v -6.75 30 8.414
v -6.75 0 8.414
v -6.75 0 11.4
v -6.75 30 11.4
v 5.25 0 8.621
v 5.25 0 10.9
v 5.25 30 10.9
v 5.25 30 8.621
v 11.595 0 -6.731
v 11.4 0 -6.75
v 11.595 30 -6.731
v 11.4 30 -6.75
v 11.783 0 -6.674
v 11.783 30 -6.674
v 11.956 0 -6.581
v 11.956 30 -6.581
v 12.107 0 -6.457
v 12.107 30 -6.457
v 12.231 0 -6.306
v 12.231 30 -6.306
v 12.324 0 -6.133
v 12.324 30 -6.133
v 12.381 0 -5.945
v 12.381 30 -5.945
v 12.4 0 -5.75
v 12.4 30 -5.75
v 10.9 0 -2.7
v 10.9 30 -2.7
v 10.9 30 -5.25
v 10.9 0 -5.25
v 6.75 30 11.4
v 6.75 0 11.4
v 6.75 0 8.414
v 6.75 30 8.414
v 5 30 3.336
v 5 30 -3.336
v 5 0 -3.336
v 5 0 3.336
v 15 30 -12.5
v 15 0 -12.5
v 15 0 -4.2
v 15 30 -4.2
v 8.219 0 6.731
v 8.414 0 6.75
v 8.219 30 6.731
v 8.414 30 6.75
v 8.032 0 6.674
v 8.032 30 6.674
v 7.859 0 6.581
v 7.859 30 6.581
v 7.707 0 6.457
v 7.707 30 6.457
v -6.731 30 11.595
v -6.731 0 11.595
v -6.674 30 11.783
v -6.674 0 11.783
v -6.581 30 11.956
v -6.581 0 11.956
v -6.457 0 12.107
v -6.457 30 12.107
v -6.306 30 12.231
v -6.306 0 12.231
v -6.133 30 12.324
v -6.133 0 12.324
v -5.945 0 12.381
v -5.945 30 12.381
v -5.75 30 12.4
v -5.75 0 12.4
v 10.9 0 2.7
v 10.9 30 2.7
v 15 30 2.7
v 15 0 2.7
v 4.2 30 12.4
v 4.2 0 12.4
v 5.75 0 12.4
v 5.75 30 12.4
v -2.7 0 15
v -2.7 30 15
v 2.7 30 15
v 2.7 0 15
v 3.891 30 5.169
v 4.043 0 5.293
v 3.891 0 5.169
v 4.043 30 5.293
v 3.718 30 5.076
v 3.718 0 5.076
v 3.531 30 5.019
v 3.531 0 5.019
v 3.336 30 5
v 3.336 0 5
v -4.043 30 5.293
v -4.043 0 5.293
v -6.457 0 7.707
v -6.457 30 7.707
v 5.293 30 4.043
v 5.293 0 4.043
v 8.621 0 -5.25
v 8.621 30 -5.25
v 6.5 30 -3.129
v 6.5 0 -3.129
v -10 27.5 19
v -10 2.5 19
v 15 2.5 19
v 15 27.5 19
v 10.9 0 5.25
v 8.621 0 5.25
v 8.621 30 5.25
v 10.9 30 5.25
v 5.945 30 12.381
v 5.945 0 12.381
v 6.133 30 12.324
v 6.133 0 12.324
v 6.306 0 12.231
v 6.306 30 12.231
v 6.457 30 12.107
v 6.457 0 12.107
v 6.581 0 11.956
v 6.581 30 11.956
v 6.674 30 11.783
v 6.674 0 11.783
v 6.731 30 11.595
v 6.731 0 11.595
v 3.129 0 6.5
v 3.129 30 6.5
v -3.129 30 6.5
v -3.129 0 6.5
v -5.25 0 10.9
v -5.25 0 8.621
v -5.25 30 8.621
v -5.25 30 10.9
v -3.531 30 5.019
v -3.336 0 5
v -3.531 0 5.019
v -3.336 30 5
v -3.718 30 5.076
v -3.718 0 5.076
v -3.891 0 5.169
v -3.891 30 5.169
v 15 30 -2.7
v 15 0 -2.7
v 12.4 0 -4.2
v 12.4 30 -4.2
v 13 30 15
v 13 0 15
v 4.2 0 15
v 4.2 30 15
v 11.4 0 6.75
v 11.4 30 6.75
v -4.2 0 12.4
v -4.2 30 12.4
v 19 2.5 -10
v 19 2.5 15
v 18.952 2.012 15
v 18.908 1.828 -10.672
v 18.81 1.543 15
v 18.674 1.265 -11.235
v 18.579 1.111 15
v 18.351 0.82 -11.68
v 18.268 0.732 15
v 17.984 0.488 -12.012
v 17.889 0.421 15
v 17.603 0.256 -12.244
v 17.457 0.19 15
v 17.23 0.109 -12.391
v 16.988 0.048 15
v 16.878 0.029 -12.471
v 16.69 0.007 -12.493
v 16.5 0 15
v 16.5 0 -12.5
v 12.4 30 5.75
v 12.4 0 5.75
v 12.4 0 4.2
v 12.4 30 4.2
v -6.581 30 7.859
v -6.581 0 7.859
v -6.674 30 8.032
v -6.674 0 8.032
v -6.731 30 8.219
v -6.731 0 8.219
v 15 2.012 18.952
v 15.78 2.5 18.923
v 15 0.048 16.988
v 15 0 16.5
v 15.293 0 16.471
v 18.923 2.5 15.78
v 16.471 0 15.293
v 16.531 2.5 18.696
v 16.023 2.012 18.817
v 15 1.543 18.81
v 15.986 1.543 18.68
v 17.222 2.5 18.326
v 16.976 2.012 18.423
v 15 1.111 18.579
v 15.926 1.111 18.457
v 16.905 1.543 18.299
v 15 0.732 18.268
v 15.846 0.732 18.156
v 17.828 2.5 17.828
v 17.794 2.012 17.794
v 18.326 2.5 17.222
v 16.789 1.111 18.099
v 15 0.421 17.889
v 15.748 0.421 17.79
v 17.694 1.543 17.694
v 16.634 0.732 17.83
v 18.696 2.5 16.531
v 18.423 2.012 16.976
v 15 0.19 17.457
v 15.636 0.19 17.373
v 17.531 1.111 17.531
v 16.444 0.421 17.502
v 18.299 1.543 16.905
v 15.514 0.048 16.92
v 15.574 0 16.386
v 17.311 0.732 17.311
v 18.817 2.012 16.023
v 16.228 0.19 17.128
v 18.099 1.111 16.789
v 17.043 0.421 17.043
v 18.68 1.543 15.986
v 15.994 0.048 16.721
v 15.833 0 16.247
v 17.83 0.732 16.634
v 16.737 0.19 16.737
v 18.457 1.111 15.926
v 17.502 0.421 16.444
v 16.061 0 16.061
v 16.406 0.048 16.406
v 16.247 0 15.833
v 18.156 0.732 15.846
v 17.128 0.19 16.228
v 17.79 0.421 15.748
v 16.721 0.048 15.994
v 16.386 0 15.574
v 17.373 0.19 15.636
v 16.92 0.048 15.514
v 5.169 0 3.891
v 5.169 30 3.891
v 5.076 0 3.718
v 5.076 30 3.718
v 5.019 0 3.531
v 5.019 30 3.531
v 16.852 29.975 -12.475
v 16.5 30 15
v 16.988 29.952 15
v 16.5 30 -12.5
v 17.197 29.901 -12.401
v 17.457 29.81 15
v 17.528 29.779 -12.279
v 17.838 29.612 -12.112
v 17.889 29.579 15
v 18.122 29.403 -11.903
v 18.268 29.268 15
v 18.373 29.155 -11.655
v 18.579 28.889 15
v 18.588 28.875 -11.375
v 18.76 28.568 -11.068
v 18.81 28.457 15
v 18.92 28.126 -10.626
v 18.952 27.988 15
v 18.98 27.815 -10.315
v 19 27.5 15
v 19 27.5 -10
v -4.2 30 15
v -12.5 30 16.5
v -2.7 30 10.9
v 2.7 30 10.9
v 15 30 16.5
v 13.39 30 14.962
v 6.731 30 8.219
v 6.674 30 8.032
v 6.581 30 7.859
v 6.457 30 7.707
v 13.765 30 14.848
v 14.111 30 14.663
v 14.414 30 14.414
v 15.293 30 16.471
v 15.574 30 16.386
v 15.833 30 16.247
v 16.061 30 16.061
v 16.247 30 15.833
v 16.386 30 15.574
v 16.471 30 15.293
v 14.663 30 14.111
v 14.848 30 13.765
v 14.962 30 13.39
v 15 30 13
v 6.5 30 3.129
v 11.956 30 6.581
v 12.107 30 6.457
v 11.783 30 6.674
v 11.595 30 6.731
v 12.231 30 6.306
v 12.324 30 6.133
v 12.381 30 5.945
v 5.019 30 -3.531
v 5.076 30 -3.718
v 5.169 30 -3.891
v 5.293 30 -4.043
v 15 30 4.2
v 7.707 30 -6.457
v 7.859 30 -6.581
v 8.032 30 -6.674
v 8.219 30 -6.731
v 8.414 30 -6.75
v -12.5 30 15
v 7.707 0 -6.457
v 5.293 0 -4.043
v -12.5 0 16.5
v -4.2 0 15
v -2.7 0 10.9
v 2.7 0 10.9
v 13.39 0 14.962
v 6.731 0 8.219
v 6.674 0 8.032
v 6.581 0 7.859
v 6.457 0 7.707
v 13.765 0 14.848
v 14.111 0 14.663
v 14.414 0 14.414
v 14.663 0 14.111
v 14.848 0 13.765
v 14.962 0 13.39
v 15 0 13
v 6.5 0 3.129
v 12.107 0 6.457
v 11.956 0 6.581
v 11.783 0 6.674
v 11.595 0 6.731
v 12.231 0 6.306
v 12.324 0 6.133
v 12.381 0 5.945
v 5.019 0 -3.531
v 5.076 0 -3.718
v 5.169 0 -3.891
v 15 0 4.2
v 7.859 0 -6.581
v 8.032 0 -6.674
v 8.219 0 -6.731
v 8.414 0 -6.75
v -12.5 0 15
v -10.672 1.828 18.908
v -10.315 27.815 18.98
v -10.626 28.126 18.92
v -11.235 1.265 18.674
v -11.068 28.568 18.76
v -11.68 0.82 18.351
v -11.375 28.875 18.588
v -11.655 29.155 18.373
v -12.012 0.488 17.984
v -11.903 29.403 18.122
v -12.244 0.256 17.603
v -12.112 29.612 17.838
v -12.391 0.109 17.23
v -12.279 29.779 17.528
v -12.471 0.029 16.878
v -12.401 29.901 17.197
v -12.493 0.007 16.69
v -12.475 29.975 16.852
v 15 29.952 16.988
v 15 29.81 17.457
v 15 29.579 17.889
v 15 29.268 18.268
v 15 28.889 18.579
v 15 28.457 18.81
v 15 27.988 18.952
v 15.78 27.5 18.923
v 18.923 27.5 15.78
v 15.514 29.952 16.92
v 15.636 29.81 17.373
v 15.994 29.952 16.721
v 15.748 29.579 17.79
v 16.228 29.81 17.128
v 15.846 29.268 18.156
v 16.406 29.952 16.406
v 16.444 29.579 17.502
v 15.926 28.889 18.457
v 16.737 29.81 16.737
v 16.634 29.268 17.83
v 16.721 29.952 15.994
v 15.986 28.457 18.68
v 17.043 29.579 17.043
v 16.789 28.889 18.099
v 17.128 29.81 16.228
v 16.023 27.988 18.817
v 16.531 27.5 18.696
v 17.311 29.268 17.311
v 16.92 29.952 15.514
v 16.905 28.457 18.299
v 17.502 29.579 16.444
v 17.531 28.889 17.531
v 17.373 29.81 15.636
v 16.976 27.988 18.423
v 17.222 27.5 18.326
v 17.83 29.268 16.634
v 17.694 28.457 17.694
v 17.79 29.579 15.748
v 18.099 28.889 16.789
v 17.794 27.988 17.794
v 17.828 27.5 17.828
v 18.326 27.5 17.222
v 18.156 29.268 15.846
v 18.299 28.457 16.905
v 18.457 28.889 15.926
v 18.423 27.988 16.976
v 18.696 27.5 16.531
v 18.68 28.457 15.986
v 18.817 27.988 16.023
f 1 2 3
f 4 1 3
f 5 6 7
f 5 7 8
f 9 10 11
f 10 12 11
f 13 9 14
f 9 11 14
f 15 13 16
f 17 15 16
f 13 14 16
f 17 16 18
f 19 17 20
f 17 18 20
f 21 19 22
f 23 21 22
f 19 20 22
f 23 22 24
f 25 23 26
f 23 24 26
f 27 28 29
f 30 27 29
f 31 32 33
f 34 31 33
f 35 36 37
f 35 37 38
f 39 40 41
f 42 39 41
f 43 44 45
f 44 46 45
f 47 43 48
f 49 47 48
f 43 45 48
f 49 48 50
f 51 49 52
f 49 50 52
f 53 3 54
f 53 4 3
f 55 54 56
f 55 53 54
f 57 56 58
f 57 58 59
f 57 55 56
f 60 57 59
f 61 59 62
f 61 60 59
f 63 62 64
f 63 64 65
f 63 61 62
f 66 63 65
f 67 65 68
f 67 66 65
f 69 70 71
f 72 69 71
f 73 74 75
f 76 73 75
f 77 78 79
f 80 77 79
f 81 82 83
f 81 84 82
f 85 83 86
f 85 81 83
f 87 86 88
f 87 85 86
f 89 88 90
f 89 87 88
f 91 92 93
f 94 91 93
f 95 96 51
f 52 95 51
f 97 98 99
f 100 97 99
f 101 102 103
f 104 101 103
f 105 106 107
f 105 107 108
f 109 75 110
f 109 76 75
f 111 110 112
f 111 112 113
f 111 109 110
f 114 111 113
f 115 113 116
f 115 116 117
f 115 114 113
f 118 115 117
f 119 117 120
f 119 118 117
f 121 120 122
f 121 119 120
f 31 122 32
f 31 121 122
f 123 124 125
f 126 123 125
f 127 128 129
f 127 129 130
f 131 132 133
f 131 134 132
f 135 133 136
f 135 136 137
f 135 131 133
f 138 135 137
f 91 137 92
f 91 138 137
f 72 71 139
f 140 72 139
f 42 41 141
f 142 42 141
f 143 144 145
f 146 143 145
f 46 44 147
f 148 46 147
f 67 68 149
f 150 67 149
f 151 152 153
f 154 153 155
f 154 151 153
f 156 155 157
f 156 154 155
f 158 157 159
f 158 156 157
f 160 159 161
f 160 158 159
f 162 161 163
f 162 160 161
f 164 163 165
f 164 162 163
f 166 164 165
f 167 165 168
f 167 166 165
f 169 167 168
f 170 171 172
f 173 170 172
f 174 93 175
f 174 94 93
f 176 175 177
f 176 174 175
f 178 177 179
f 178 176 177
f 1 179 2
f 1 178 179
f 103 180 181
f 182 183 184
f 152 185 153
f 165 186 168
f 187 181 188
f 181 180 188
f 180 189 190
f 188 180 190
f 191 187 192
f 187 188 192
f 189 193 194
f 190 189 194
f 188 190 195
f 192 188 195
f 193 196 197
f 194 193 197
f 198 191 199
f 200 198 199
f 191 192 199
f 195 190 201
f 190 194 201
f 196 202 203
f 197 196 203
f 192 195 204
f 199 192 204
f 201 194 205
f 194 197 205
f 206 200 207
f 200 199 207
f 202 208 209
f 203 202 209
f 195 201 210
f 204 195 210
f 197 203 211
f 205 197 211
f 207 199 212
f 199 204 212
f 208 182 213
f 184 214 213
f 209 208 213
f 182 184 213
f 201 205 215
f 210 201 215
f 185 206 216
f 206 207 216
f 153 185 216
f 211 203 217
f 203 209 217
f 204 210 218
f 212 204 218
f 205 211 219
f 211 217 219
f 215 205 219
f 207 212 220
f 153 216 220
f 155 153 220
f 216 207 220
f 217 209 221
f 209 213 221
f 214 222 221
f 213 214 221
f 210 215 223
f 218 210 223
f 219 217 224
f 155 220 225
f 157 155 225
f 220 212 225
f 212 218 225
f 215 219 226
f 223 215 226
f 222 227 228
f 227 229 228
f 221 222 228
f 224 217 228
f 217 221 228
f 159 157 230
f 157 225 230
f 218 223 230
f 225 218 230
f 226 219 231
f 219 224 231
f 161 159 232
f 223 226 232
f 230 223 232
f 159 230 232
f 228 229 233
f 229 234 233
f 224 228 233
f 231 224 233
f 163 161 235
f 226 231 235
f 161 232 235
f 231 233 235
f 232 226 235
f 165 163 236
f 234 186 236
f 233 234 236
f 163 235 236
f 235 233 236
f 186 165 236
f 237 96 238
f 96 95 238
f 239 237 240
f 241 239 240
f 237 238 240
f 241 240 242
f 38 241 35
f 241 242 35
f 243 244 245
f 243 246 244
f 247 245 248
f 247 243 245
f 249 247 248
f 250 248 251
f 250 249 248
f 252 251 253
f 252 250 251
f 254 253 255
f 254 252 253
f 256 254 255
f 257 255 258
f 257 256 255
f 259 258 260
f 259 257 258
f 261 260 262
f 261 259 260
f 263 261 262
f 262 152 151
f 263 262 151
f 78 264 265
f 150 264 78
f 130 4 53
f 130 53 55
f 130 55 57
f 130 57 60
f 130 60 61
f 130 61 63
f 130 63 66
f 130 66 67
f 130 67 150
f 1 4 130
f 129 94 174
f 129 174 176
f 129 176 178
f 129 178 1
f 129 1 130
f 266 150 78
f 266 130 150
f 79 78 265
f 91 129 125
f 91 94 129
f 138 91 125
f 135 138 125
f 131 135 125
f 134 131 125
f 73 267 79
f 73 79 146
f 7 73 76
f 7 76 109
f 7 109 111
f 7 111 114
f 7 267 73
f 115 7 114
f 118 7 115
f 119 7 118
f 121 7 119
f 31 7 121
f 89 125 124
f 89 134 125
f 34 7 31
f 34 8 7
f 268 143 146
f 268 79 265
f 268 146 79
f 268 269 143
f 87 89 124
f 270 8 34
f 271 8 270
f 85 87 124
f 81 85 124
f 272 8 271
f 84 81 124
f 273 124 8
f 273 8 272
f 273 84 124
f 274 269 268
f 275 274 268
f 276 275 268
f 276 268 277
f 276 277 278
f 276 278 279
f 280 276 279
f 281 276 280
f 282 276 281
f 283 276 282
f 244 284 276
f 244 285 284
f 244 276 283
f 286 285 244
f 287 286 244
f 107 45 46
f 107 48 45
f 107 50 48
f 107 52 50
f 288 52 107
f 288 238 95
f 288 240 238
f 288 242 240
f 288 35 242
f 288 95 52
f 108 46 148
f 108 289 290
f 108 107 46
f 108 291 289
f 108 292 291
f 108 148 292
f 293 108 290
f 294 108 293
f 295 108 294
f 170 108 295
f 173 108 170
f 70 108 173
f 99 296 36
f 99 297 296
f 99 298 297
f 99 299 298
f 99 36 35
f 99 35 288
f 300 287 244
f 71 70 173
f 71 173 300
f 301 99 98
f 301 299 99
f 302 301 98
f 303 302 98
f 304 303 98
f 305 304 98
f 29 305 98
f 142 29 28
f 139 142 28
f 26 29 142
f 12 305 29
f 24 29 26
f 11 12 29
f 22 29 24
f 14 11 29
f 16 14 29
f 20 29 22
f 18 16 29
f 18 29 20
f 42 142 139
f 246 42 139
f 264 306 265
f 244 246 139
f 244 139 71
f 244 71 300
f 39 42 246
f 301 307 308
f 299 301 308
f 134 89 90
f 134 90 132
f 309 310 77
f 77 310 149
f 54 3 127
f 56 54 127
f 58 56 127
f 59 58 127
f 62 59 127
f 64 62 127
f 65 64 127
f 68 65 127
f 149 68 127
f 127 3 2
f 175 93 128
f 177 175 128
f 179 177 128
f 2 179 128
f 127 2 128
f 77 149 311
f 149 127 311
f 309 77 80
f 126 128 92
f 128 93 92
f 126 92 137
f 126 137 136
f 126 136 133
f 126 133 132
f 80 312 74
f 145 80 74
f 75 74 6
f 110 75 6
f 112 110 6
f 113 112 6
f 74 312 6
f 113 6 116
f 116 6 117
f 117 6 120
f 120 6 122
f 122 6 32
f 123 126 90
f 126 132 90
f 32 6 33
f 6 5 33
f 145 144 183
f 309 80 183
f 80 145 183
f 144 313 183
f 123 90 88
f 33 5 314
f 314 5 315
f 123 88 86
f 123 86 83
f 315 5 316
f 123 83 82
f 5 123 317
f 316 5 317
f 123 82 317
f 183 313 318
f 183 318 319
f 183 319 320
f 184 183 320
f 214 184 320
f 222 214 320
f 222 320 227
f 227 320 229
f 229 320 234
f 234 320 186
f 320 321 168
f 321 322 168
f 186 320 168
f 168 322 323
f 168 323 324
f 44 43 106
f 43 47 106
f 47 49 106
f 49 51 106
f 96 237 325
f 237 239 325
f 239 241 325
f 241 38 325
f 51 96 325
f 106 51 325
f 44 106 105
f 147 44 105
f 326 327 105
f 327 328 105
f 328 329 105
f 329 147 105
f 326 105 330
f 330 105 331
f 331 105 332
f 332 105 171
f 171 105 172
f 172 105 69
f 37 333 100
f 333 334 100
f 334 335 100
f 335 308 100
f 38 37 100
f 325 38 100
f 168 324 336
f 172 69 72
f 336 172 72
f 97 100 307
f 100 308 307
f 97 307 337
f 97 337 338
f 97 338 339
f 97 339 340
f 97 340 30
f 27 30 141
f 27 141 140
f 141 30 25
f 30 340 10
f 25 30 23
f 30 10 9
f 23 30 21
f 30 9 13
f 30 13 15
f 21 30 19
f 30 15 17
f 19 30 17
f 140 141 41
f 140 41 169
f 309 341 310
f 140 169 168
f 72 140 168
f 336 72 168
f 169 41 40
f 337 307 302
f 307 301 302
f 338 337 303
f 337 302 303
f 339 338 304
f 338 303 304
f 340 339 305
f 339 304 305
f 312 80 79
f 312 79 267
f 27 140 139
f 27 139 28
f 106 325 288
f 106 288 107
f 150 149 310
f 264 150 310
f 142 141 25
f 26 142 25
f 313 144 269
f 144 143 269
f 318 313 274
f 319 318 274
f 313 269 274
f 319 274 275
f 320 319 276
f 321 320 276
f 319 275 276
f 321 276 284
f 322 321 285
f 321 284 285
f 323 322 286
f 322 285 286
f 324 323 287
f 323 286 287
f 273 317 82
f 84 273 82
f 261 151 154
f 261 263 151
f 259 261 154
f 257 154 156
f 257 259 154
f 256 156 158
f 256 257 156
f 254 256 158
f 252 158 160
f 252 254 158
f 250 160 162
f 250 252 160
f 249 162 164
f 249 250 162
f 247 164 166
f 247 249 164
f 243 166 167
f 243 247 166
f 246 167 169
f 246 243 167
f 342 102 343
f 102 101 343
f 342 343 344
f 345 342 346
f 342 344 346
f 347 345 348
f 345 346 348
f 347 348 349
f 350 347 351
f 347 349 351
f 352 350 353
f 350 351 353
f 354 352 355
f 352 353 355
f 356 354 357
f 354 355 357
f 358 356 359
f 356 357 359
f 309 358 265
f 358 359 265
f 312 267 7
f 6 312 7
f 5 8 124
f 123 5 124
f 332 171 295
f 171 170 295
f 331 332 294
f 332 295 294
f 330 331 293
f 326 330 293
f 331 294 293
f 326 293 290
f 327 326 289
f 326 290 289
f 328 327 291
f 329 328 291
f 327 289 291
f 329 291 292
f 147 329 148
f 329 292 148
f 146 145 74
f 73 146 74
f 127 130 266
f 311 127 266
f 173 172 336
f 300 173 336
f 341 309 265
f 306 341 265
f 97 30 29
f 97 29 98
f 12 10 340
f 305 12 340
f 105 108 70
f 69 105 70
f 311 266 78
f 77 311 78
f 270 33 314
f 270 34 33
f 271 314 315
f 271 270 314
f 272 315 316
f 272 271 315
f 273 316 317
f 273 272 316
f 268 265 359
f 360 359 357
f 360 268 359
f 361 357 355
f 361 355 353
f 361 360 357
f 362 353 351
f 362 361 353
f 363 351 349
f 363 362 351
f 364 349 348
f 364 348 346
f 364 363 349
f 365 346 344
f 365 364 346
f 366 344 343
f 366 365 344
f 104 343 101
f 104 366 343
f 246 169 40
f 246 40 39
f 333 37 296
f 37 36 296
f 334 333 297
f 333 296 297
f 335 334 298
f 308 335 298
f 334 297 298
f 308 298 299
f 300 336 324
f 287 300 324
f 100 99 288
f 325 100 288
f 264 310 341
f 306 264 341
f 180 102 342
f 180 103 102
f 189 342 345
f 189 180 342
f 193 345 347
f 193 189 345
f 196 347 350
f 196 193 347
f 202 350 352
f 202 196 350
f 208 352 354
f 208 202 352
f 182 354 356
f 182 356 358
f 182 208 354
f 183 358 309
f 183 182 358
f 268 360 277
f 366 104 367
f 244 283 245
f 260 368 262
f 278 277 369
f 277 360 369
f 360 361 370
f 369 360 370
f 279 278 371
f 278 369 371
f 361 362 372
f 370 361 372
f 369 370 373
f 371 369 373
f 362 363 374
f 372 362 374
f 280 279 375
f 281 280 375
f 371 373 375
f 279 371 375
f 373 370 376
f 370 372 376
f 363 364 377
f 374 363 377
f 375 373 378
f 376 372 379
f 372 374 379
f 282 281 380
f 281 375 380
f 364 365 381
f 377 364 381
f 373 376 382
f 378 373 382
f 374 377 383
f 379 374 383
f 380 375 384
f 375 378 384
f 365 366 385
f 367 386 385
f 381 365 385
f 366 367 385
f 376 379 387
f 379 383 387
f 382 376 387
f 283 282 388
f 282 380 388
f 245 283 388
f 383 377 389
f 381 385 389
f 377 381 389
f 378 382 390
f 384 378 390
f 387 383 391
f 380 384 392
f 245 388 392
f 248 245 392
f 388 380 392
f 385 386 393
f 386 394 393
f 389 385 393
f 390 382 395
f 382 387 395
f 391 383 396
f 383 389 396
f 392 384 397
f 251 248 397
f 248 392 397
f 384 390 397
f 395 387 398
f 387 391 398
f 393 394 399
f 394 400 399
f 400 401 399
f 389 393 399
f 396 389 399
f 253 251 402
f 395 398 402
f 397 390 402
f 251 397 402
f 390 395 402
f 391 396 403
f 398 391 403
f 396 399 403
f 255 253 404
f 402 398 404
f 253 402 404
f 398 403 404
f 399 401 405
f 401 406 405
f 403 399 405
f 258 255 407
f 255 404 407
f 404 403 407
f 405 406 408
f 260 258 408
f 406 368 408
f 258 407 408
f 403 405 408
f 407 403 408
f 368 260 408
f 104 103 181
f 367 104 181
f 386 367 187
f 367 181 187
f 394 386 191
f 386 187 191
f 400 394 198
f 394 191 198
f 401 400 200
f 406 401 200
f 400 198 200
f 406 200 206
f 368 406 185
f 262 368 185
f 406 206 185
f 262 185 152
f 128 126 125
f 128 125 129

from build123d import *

# Parameters (mm, degrees)
BOSS_EXTRUDE1_DEPTH = 30
CUT_EXTRUDE3_REACH  = 51.163
SKETCH4_W           = 2.5
SKETCH4_H           = 30
CUT_EXTRUDE4_REACH  = 49.468
SKETCH5_W           = 2.5
SKETCH5_H           = 30
FILLET1_R           = 2.5
FILLET2_R           = 2
FILLET3_R           = 1
CUT_EXTRUDE5_REACH  = 42.274


with BuildPart() as part:
    # Sketch1 → Boss-Extrude1 (new body)
    with BuildSketch(Plane(origin=(0, 0, 0), x_dir=(1, 0, 0), z_dir=(0, 1, 0))):
        with BuildLine():
            Line((19, -15), (19, 15))
            Line((19, 15), (15, 15))
            Line((15, 15), (15, 4.2))
            Line((15, 4.2), (12.4, 4.2))
            Line((12.4, 4.2), (12.4, 6.75))
            Line((12.4, 6.75), (8, 6.75))
            Line((8, 6.75), (5, 3.75))
            Line((5, 3.75), (5, -3.75))
            Line((5, -3.75), (8, -6.75))
            Line((8, -6.75), (12.4, -6.75))
            Line((12.4, -6.75), (12.4, -4.2))
            Line((12.4, -4.2), (15, -4.2))
            Line((15, -4.2), (15, -15))
            Line((15, -15), (4.2, -15))
            Line((4.2, -15), (4.2, -12.4))
            Line((4.2, -12.4), (6.75, -12.4))
            Line((6.75, -12.4), (6.75, -8))
            Line((6.75, -8), (3.75, -5))
            Line((3.75, -5), (-3.75, -5))
            Line((-3.75, -5), (-6.75, -8))
            Line((-6.75, -8), (-6.75, -12.4))
            Line((-6.75, -12.4), (-4.2, -12.4))
            Line((-4.2, -12.4), (-4.2, -15))
            Line((-4.2, -15), (-15, -15))
            Line((-15, -15), (-15, -19))
            Line((-15, -19), (15, -19))
            ThreePointArc((15, -19), (17.828427125, -17.828427125), (19, -15))
        make_face()
    extrude(amount=BOSS_EXTRUDE1_DEPTH)

    # Sketch4 → Cut-Extrude3 (cut, up to next)
    with BuildSketch(Plane.XY.offset(19), mode=Mode.PRIVATE) as cut_extrude3_sk1:
        with Locations((-13.75, 15)):
            Rectangle(SKETCH4_W, SKETCH4_H)
    cut_extrude3_tool1 = extrude(cut_extrude3_sk1.sketch, amount=-CUT_EXTRUDE3_REACH, mode=Mode.PRIVATE) & part.part
    add(cut_extrude3_tool1.solids().sort_by_distance((-13.75, 15, 19))[0], mode=Mode.SUBTRACT)

    # Sketch5 → Cut-Extrude4 (cut, up to next)
    with BuildSketch(Plane(origin=(19, 0, 0), x_dir=(0, 0, -1), z_dir=(1, 0, 0)), mode=Mode.PRIVATE) as cut_extrude4_sk1:
        with Locations((13.75, 15)):
            Rectangle(SKETCH5_W, SKETCH5_H)
    cut_extrude4_tool1 = extrude(cut_extrude4_sk1.sketch, amount=-CUT_EXTRUDE4_REACH, mode=Mode.PRIVATE) & part.part
    add(cut_extrude4_tool1.solids().sort_by_distance((19, 15, -13.75))[0], mode=Mode.SUBTRACT)

    # Fillet1
    fillet1_edges = [part.edges().sort_by_distance(p)[0] for p in [
        (17.828427125, 30, 17.828427125),
        (19, 0, 1.25),
        (19, 30, 1.25),
        (19, 15, -12.5),
        (17.828427125, 0, 17.828427125),
        (1.25, 0, 19),
        (1.25, 30, 19),
        (-12.5, 15, 19),
    ]]
    fillet(fillet1_edges, radius=FILLET1_R)

    # Fillet2
    fillet2_edges = [part.edges().sort_by_distance(p)[0] for p in [
        (15, 15, 15),
    ]]
    fillet(fillet2_edges, radius=FILLET2_R)

    # Fillet3
    fillet3_edges = [part.edges().sort_by_distance(p)[0] for p in [
        (-6.75, 15, 12.4),
        (-6.75, 15, 8),
        (-3.75, 15, 5),
        (3.75, 15, 5),
        (6.75, 15, 8),
        (6.75, 15, 12.4),
        (12.4, 15, 6.75),
        (8, 15, 6.75),
        (5, 15, 3.75),
        (5, 15, -3.75),
        (8, 15, -6.75),
        (12.4, 15, -6.75),
    ]]
    fillet(fillet3_edges, radius=FILLET3_R)

    # Sketch6 → Cut-Extrude5 (cut, up to next)
    with BuildSketch(Plane(origin=(0, 30, 0), x_dir=(1, 0, 0), z_dir=(0, 1, 0)), mode=Mode.PRIVATE) as cut_extrude5_sk1:
        Polygon((5.25, -8.621320344), (3.128679656, -6.5), (-3.128679656, -6.5), (-5.25, -8.621320344), (-5.25, -10.9), (-2.7, -10.9), (-2.7, -15), (2.7, -15), (2.7, -10.9), (5.25, -10.9), align=None)
    cut_extrude5_tool1 = extrude(cut_extrude5_sk1.sketch, amount=-CUT_EXTRUDE5_REACH, mode=Mode.PRIVATE) & part.part
    # Sketch6 → Cut-Extrude5 (cut, up to next)
    with BuildSketch(Plane(origin=(0, 30, 0), x_dir=(1, 0, 0), z_dir=(0, 1, 0)), mode=Mode.PRIVATE) as cut_extrude5_sk2:
        Polygon((10.9, -2.7), (15, -2.7), (15, 2.7), (10.9, 2.7), (10.9, 5.25), (8.621320344, 5.25), (6.5, 3.128679656), (6.5, -3.128679656), (8.621320344, -5.25), (10.9, -5.25), align=None)
    cut_extrude5_tool2 = extrude(cut_extrude5_sk2.sketch, amount=-CUT_EXTRUDE5_REACH, mode=Mode.PRIVATE) & part.part
    add(cut_extrude5_tool1.solids().sort_by_distance((0, 30, 10.279151))[0], mode=Mode.SUBTRACT)
    add(cut_extrude5_tool2.solids().sort_by_distance((10.279151, 30, 0))[0], mode=Mode.SUBTRACT)


solid = part.part
